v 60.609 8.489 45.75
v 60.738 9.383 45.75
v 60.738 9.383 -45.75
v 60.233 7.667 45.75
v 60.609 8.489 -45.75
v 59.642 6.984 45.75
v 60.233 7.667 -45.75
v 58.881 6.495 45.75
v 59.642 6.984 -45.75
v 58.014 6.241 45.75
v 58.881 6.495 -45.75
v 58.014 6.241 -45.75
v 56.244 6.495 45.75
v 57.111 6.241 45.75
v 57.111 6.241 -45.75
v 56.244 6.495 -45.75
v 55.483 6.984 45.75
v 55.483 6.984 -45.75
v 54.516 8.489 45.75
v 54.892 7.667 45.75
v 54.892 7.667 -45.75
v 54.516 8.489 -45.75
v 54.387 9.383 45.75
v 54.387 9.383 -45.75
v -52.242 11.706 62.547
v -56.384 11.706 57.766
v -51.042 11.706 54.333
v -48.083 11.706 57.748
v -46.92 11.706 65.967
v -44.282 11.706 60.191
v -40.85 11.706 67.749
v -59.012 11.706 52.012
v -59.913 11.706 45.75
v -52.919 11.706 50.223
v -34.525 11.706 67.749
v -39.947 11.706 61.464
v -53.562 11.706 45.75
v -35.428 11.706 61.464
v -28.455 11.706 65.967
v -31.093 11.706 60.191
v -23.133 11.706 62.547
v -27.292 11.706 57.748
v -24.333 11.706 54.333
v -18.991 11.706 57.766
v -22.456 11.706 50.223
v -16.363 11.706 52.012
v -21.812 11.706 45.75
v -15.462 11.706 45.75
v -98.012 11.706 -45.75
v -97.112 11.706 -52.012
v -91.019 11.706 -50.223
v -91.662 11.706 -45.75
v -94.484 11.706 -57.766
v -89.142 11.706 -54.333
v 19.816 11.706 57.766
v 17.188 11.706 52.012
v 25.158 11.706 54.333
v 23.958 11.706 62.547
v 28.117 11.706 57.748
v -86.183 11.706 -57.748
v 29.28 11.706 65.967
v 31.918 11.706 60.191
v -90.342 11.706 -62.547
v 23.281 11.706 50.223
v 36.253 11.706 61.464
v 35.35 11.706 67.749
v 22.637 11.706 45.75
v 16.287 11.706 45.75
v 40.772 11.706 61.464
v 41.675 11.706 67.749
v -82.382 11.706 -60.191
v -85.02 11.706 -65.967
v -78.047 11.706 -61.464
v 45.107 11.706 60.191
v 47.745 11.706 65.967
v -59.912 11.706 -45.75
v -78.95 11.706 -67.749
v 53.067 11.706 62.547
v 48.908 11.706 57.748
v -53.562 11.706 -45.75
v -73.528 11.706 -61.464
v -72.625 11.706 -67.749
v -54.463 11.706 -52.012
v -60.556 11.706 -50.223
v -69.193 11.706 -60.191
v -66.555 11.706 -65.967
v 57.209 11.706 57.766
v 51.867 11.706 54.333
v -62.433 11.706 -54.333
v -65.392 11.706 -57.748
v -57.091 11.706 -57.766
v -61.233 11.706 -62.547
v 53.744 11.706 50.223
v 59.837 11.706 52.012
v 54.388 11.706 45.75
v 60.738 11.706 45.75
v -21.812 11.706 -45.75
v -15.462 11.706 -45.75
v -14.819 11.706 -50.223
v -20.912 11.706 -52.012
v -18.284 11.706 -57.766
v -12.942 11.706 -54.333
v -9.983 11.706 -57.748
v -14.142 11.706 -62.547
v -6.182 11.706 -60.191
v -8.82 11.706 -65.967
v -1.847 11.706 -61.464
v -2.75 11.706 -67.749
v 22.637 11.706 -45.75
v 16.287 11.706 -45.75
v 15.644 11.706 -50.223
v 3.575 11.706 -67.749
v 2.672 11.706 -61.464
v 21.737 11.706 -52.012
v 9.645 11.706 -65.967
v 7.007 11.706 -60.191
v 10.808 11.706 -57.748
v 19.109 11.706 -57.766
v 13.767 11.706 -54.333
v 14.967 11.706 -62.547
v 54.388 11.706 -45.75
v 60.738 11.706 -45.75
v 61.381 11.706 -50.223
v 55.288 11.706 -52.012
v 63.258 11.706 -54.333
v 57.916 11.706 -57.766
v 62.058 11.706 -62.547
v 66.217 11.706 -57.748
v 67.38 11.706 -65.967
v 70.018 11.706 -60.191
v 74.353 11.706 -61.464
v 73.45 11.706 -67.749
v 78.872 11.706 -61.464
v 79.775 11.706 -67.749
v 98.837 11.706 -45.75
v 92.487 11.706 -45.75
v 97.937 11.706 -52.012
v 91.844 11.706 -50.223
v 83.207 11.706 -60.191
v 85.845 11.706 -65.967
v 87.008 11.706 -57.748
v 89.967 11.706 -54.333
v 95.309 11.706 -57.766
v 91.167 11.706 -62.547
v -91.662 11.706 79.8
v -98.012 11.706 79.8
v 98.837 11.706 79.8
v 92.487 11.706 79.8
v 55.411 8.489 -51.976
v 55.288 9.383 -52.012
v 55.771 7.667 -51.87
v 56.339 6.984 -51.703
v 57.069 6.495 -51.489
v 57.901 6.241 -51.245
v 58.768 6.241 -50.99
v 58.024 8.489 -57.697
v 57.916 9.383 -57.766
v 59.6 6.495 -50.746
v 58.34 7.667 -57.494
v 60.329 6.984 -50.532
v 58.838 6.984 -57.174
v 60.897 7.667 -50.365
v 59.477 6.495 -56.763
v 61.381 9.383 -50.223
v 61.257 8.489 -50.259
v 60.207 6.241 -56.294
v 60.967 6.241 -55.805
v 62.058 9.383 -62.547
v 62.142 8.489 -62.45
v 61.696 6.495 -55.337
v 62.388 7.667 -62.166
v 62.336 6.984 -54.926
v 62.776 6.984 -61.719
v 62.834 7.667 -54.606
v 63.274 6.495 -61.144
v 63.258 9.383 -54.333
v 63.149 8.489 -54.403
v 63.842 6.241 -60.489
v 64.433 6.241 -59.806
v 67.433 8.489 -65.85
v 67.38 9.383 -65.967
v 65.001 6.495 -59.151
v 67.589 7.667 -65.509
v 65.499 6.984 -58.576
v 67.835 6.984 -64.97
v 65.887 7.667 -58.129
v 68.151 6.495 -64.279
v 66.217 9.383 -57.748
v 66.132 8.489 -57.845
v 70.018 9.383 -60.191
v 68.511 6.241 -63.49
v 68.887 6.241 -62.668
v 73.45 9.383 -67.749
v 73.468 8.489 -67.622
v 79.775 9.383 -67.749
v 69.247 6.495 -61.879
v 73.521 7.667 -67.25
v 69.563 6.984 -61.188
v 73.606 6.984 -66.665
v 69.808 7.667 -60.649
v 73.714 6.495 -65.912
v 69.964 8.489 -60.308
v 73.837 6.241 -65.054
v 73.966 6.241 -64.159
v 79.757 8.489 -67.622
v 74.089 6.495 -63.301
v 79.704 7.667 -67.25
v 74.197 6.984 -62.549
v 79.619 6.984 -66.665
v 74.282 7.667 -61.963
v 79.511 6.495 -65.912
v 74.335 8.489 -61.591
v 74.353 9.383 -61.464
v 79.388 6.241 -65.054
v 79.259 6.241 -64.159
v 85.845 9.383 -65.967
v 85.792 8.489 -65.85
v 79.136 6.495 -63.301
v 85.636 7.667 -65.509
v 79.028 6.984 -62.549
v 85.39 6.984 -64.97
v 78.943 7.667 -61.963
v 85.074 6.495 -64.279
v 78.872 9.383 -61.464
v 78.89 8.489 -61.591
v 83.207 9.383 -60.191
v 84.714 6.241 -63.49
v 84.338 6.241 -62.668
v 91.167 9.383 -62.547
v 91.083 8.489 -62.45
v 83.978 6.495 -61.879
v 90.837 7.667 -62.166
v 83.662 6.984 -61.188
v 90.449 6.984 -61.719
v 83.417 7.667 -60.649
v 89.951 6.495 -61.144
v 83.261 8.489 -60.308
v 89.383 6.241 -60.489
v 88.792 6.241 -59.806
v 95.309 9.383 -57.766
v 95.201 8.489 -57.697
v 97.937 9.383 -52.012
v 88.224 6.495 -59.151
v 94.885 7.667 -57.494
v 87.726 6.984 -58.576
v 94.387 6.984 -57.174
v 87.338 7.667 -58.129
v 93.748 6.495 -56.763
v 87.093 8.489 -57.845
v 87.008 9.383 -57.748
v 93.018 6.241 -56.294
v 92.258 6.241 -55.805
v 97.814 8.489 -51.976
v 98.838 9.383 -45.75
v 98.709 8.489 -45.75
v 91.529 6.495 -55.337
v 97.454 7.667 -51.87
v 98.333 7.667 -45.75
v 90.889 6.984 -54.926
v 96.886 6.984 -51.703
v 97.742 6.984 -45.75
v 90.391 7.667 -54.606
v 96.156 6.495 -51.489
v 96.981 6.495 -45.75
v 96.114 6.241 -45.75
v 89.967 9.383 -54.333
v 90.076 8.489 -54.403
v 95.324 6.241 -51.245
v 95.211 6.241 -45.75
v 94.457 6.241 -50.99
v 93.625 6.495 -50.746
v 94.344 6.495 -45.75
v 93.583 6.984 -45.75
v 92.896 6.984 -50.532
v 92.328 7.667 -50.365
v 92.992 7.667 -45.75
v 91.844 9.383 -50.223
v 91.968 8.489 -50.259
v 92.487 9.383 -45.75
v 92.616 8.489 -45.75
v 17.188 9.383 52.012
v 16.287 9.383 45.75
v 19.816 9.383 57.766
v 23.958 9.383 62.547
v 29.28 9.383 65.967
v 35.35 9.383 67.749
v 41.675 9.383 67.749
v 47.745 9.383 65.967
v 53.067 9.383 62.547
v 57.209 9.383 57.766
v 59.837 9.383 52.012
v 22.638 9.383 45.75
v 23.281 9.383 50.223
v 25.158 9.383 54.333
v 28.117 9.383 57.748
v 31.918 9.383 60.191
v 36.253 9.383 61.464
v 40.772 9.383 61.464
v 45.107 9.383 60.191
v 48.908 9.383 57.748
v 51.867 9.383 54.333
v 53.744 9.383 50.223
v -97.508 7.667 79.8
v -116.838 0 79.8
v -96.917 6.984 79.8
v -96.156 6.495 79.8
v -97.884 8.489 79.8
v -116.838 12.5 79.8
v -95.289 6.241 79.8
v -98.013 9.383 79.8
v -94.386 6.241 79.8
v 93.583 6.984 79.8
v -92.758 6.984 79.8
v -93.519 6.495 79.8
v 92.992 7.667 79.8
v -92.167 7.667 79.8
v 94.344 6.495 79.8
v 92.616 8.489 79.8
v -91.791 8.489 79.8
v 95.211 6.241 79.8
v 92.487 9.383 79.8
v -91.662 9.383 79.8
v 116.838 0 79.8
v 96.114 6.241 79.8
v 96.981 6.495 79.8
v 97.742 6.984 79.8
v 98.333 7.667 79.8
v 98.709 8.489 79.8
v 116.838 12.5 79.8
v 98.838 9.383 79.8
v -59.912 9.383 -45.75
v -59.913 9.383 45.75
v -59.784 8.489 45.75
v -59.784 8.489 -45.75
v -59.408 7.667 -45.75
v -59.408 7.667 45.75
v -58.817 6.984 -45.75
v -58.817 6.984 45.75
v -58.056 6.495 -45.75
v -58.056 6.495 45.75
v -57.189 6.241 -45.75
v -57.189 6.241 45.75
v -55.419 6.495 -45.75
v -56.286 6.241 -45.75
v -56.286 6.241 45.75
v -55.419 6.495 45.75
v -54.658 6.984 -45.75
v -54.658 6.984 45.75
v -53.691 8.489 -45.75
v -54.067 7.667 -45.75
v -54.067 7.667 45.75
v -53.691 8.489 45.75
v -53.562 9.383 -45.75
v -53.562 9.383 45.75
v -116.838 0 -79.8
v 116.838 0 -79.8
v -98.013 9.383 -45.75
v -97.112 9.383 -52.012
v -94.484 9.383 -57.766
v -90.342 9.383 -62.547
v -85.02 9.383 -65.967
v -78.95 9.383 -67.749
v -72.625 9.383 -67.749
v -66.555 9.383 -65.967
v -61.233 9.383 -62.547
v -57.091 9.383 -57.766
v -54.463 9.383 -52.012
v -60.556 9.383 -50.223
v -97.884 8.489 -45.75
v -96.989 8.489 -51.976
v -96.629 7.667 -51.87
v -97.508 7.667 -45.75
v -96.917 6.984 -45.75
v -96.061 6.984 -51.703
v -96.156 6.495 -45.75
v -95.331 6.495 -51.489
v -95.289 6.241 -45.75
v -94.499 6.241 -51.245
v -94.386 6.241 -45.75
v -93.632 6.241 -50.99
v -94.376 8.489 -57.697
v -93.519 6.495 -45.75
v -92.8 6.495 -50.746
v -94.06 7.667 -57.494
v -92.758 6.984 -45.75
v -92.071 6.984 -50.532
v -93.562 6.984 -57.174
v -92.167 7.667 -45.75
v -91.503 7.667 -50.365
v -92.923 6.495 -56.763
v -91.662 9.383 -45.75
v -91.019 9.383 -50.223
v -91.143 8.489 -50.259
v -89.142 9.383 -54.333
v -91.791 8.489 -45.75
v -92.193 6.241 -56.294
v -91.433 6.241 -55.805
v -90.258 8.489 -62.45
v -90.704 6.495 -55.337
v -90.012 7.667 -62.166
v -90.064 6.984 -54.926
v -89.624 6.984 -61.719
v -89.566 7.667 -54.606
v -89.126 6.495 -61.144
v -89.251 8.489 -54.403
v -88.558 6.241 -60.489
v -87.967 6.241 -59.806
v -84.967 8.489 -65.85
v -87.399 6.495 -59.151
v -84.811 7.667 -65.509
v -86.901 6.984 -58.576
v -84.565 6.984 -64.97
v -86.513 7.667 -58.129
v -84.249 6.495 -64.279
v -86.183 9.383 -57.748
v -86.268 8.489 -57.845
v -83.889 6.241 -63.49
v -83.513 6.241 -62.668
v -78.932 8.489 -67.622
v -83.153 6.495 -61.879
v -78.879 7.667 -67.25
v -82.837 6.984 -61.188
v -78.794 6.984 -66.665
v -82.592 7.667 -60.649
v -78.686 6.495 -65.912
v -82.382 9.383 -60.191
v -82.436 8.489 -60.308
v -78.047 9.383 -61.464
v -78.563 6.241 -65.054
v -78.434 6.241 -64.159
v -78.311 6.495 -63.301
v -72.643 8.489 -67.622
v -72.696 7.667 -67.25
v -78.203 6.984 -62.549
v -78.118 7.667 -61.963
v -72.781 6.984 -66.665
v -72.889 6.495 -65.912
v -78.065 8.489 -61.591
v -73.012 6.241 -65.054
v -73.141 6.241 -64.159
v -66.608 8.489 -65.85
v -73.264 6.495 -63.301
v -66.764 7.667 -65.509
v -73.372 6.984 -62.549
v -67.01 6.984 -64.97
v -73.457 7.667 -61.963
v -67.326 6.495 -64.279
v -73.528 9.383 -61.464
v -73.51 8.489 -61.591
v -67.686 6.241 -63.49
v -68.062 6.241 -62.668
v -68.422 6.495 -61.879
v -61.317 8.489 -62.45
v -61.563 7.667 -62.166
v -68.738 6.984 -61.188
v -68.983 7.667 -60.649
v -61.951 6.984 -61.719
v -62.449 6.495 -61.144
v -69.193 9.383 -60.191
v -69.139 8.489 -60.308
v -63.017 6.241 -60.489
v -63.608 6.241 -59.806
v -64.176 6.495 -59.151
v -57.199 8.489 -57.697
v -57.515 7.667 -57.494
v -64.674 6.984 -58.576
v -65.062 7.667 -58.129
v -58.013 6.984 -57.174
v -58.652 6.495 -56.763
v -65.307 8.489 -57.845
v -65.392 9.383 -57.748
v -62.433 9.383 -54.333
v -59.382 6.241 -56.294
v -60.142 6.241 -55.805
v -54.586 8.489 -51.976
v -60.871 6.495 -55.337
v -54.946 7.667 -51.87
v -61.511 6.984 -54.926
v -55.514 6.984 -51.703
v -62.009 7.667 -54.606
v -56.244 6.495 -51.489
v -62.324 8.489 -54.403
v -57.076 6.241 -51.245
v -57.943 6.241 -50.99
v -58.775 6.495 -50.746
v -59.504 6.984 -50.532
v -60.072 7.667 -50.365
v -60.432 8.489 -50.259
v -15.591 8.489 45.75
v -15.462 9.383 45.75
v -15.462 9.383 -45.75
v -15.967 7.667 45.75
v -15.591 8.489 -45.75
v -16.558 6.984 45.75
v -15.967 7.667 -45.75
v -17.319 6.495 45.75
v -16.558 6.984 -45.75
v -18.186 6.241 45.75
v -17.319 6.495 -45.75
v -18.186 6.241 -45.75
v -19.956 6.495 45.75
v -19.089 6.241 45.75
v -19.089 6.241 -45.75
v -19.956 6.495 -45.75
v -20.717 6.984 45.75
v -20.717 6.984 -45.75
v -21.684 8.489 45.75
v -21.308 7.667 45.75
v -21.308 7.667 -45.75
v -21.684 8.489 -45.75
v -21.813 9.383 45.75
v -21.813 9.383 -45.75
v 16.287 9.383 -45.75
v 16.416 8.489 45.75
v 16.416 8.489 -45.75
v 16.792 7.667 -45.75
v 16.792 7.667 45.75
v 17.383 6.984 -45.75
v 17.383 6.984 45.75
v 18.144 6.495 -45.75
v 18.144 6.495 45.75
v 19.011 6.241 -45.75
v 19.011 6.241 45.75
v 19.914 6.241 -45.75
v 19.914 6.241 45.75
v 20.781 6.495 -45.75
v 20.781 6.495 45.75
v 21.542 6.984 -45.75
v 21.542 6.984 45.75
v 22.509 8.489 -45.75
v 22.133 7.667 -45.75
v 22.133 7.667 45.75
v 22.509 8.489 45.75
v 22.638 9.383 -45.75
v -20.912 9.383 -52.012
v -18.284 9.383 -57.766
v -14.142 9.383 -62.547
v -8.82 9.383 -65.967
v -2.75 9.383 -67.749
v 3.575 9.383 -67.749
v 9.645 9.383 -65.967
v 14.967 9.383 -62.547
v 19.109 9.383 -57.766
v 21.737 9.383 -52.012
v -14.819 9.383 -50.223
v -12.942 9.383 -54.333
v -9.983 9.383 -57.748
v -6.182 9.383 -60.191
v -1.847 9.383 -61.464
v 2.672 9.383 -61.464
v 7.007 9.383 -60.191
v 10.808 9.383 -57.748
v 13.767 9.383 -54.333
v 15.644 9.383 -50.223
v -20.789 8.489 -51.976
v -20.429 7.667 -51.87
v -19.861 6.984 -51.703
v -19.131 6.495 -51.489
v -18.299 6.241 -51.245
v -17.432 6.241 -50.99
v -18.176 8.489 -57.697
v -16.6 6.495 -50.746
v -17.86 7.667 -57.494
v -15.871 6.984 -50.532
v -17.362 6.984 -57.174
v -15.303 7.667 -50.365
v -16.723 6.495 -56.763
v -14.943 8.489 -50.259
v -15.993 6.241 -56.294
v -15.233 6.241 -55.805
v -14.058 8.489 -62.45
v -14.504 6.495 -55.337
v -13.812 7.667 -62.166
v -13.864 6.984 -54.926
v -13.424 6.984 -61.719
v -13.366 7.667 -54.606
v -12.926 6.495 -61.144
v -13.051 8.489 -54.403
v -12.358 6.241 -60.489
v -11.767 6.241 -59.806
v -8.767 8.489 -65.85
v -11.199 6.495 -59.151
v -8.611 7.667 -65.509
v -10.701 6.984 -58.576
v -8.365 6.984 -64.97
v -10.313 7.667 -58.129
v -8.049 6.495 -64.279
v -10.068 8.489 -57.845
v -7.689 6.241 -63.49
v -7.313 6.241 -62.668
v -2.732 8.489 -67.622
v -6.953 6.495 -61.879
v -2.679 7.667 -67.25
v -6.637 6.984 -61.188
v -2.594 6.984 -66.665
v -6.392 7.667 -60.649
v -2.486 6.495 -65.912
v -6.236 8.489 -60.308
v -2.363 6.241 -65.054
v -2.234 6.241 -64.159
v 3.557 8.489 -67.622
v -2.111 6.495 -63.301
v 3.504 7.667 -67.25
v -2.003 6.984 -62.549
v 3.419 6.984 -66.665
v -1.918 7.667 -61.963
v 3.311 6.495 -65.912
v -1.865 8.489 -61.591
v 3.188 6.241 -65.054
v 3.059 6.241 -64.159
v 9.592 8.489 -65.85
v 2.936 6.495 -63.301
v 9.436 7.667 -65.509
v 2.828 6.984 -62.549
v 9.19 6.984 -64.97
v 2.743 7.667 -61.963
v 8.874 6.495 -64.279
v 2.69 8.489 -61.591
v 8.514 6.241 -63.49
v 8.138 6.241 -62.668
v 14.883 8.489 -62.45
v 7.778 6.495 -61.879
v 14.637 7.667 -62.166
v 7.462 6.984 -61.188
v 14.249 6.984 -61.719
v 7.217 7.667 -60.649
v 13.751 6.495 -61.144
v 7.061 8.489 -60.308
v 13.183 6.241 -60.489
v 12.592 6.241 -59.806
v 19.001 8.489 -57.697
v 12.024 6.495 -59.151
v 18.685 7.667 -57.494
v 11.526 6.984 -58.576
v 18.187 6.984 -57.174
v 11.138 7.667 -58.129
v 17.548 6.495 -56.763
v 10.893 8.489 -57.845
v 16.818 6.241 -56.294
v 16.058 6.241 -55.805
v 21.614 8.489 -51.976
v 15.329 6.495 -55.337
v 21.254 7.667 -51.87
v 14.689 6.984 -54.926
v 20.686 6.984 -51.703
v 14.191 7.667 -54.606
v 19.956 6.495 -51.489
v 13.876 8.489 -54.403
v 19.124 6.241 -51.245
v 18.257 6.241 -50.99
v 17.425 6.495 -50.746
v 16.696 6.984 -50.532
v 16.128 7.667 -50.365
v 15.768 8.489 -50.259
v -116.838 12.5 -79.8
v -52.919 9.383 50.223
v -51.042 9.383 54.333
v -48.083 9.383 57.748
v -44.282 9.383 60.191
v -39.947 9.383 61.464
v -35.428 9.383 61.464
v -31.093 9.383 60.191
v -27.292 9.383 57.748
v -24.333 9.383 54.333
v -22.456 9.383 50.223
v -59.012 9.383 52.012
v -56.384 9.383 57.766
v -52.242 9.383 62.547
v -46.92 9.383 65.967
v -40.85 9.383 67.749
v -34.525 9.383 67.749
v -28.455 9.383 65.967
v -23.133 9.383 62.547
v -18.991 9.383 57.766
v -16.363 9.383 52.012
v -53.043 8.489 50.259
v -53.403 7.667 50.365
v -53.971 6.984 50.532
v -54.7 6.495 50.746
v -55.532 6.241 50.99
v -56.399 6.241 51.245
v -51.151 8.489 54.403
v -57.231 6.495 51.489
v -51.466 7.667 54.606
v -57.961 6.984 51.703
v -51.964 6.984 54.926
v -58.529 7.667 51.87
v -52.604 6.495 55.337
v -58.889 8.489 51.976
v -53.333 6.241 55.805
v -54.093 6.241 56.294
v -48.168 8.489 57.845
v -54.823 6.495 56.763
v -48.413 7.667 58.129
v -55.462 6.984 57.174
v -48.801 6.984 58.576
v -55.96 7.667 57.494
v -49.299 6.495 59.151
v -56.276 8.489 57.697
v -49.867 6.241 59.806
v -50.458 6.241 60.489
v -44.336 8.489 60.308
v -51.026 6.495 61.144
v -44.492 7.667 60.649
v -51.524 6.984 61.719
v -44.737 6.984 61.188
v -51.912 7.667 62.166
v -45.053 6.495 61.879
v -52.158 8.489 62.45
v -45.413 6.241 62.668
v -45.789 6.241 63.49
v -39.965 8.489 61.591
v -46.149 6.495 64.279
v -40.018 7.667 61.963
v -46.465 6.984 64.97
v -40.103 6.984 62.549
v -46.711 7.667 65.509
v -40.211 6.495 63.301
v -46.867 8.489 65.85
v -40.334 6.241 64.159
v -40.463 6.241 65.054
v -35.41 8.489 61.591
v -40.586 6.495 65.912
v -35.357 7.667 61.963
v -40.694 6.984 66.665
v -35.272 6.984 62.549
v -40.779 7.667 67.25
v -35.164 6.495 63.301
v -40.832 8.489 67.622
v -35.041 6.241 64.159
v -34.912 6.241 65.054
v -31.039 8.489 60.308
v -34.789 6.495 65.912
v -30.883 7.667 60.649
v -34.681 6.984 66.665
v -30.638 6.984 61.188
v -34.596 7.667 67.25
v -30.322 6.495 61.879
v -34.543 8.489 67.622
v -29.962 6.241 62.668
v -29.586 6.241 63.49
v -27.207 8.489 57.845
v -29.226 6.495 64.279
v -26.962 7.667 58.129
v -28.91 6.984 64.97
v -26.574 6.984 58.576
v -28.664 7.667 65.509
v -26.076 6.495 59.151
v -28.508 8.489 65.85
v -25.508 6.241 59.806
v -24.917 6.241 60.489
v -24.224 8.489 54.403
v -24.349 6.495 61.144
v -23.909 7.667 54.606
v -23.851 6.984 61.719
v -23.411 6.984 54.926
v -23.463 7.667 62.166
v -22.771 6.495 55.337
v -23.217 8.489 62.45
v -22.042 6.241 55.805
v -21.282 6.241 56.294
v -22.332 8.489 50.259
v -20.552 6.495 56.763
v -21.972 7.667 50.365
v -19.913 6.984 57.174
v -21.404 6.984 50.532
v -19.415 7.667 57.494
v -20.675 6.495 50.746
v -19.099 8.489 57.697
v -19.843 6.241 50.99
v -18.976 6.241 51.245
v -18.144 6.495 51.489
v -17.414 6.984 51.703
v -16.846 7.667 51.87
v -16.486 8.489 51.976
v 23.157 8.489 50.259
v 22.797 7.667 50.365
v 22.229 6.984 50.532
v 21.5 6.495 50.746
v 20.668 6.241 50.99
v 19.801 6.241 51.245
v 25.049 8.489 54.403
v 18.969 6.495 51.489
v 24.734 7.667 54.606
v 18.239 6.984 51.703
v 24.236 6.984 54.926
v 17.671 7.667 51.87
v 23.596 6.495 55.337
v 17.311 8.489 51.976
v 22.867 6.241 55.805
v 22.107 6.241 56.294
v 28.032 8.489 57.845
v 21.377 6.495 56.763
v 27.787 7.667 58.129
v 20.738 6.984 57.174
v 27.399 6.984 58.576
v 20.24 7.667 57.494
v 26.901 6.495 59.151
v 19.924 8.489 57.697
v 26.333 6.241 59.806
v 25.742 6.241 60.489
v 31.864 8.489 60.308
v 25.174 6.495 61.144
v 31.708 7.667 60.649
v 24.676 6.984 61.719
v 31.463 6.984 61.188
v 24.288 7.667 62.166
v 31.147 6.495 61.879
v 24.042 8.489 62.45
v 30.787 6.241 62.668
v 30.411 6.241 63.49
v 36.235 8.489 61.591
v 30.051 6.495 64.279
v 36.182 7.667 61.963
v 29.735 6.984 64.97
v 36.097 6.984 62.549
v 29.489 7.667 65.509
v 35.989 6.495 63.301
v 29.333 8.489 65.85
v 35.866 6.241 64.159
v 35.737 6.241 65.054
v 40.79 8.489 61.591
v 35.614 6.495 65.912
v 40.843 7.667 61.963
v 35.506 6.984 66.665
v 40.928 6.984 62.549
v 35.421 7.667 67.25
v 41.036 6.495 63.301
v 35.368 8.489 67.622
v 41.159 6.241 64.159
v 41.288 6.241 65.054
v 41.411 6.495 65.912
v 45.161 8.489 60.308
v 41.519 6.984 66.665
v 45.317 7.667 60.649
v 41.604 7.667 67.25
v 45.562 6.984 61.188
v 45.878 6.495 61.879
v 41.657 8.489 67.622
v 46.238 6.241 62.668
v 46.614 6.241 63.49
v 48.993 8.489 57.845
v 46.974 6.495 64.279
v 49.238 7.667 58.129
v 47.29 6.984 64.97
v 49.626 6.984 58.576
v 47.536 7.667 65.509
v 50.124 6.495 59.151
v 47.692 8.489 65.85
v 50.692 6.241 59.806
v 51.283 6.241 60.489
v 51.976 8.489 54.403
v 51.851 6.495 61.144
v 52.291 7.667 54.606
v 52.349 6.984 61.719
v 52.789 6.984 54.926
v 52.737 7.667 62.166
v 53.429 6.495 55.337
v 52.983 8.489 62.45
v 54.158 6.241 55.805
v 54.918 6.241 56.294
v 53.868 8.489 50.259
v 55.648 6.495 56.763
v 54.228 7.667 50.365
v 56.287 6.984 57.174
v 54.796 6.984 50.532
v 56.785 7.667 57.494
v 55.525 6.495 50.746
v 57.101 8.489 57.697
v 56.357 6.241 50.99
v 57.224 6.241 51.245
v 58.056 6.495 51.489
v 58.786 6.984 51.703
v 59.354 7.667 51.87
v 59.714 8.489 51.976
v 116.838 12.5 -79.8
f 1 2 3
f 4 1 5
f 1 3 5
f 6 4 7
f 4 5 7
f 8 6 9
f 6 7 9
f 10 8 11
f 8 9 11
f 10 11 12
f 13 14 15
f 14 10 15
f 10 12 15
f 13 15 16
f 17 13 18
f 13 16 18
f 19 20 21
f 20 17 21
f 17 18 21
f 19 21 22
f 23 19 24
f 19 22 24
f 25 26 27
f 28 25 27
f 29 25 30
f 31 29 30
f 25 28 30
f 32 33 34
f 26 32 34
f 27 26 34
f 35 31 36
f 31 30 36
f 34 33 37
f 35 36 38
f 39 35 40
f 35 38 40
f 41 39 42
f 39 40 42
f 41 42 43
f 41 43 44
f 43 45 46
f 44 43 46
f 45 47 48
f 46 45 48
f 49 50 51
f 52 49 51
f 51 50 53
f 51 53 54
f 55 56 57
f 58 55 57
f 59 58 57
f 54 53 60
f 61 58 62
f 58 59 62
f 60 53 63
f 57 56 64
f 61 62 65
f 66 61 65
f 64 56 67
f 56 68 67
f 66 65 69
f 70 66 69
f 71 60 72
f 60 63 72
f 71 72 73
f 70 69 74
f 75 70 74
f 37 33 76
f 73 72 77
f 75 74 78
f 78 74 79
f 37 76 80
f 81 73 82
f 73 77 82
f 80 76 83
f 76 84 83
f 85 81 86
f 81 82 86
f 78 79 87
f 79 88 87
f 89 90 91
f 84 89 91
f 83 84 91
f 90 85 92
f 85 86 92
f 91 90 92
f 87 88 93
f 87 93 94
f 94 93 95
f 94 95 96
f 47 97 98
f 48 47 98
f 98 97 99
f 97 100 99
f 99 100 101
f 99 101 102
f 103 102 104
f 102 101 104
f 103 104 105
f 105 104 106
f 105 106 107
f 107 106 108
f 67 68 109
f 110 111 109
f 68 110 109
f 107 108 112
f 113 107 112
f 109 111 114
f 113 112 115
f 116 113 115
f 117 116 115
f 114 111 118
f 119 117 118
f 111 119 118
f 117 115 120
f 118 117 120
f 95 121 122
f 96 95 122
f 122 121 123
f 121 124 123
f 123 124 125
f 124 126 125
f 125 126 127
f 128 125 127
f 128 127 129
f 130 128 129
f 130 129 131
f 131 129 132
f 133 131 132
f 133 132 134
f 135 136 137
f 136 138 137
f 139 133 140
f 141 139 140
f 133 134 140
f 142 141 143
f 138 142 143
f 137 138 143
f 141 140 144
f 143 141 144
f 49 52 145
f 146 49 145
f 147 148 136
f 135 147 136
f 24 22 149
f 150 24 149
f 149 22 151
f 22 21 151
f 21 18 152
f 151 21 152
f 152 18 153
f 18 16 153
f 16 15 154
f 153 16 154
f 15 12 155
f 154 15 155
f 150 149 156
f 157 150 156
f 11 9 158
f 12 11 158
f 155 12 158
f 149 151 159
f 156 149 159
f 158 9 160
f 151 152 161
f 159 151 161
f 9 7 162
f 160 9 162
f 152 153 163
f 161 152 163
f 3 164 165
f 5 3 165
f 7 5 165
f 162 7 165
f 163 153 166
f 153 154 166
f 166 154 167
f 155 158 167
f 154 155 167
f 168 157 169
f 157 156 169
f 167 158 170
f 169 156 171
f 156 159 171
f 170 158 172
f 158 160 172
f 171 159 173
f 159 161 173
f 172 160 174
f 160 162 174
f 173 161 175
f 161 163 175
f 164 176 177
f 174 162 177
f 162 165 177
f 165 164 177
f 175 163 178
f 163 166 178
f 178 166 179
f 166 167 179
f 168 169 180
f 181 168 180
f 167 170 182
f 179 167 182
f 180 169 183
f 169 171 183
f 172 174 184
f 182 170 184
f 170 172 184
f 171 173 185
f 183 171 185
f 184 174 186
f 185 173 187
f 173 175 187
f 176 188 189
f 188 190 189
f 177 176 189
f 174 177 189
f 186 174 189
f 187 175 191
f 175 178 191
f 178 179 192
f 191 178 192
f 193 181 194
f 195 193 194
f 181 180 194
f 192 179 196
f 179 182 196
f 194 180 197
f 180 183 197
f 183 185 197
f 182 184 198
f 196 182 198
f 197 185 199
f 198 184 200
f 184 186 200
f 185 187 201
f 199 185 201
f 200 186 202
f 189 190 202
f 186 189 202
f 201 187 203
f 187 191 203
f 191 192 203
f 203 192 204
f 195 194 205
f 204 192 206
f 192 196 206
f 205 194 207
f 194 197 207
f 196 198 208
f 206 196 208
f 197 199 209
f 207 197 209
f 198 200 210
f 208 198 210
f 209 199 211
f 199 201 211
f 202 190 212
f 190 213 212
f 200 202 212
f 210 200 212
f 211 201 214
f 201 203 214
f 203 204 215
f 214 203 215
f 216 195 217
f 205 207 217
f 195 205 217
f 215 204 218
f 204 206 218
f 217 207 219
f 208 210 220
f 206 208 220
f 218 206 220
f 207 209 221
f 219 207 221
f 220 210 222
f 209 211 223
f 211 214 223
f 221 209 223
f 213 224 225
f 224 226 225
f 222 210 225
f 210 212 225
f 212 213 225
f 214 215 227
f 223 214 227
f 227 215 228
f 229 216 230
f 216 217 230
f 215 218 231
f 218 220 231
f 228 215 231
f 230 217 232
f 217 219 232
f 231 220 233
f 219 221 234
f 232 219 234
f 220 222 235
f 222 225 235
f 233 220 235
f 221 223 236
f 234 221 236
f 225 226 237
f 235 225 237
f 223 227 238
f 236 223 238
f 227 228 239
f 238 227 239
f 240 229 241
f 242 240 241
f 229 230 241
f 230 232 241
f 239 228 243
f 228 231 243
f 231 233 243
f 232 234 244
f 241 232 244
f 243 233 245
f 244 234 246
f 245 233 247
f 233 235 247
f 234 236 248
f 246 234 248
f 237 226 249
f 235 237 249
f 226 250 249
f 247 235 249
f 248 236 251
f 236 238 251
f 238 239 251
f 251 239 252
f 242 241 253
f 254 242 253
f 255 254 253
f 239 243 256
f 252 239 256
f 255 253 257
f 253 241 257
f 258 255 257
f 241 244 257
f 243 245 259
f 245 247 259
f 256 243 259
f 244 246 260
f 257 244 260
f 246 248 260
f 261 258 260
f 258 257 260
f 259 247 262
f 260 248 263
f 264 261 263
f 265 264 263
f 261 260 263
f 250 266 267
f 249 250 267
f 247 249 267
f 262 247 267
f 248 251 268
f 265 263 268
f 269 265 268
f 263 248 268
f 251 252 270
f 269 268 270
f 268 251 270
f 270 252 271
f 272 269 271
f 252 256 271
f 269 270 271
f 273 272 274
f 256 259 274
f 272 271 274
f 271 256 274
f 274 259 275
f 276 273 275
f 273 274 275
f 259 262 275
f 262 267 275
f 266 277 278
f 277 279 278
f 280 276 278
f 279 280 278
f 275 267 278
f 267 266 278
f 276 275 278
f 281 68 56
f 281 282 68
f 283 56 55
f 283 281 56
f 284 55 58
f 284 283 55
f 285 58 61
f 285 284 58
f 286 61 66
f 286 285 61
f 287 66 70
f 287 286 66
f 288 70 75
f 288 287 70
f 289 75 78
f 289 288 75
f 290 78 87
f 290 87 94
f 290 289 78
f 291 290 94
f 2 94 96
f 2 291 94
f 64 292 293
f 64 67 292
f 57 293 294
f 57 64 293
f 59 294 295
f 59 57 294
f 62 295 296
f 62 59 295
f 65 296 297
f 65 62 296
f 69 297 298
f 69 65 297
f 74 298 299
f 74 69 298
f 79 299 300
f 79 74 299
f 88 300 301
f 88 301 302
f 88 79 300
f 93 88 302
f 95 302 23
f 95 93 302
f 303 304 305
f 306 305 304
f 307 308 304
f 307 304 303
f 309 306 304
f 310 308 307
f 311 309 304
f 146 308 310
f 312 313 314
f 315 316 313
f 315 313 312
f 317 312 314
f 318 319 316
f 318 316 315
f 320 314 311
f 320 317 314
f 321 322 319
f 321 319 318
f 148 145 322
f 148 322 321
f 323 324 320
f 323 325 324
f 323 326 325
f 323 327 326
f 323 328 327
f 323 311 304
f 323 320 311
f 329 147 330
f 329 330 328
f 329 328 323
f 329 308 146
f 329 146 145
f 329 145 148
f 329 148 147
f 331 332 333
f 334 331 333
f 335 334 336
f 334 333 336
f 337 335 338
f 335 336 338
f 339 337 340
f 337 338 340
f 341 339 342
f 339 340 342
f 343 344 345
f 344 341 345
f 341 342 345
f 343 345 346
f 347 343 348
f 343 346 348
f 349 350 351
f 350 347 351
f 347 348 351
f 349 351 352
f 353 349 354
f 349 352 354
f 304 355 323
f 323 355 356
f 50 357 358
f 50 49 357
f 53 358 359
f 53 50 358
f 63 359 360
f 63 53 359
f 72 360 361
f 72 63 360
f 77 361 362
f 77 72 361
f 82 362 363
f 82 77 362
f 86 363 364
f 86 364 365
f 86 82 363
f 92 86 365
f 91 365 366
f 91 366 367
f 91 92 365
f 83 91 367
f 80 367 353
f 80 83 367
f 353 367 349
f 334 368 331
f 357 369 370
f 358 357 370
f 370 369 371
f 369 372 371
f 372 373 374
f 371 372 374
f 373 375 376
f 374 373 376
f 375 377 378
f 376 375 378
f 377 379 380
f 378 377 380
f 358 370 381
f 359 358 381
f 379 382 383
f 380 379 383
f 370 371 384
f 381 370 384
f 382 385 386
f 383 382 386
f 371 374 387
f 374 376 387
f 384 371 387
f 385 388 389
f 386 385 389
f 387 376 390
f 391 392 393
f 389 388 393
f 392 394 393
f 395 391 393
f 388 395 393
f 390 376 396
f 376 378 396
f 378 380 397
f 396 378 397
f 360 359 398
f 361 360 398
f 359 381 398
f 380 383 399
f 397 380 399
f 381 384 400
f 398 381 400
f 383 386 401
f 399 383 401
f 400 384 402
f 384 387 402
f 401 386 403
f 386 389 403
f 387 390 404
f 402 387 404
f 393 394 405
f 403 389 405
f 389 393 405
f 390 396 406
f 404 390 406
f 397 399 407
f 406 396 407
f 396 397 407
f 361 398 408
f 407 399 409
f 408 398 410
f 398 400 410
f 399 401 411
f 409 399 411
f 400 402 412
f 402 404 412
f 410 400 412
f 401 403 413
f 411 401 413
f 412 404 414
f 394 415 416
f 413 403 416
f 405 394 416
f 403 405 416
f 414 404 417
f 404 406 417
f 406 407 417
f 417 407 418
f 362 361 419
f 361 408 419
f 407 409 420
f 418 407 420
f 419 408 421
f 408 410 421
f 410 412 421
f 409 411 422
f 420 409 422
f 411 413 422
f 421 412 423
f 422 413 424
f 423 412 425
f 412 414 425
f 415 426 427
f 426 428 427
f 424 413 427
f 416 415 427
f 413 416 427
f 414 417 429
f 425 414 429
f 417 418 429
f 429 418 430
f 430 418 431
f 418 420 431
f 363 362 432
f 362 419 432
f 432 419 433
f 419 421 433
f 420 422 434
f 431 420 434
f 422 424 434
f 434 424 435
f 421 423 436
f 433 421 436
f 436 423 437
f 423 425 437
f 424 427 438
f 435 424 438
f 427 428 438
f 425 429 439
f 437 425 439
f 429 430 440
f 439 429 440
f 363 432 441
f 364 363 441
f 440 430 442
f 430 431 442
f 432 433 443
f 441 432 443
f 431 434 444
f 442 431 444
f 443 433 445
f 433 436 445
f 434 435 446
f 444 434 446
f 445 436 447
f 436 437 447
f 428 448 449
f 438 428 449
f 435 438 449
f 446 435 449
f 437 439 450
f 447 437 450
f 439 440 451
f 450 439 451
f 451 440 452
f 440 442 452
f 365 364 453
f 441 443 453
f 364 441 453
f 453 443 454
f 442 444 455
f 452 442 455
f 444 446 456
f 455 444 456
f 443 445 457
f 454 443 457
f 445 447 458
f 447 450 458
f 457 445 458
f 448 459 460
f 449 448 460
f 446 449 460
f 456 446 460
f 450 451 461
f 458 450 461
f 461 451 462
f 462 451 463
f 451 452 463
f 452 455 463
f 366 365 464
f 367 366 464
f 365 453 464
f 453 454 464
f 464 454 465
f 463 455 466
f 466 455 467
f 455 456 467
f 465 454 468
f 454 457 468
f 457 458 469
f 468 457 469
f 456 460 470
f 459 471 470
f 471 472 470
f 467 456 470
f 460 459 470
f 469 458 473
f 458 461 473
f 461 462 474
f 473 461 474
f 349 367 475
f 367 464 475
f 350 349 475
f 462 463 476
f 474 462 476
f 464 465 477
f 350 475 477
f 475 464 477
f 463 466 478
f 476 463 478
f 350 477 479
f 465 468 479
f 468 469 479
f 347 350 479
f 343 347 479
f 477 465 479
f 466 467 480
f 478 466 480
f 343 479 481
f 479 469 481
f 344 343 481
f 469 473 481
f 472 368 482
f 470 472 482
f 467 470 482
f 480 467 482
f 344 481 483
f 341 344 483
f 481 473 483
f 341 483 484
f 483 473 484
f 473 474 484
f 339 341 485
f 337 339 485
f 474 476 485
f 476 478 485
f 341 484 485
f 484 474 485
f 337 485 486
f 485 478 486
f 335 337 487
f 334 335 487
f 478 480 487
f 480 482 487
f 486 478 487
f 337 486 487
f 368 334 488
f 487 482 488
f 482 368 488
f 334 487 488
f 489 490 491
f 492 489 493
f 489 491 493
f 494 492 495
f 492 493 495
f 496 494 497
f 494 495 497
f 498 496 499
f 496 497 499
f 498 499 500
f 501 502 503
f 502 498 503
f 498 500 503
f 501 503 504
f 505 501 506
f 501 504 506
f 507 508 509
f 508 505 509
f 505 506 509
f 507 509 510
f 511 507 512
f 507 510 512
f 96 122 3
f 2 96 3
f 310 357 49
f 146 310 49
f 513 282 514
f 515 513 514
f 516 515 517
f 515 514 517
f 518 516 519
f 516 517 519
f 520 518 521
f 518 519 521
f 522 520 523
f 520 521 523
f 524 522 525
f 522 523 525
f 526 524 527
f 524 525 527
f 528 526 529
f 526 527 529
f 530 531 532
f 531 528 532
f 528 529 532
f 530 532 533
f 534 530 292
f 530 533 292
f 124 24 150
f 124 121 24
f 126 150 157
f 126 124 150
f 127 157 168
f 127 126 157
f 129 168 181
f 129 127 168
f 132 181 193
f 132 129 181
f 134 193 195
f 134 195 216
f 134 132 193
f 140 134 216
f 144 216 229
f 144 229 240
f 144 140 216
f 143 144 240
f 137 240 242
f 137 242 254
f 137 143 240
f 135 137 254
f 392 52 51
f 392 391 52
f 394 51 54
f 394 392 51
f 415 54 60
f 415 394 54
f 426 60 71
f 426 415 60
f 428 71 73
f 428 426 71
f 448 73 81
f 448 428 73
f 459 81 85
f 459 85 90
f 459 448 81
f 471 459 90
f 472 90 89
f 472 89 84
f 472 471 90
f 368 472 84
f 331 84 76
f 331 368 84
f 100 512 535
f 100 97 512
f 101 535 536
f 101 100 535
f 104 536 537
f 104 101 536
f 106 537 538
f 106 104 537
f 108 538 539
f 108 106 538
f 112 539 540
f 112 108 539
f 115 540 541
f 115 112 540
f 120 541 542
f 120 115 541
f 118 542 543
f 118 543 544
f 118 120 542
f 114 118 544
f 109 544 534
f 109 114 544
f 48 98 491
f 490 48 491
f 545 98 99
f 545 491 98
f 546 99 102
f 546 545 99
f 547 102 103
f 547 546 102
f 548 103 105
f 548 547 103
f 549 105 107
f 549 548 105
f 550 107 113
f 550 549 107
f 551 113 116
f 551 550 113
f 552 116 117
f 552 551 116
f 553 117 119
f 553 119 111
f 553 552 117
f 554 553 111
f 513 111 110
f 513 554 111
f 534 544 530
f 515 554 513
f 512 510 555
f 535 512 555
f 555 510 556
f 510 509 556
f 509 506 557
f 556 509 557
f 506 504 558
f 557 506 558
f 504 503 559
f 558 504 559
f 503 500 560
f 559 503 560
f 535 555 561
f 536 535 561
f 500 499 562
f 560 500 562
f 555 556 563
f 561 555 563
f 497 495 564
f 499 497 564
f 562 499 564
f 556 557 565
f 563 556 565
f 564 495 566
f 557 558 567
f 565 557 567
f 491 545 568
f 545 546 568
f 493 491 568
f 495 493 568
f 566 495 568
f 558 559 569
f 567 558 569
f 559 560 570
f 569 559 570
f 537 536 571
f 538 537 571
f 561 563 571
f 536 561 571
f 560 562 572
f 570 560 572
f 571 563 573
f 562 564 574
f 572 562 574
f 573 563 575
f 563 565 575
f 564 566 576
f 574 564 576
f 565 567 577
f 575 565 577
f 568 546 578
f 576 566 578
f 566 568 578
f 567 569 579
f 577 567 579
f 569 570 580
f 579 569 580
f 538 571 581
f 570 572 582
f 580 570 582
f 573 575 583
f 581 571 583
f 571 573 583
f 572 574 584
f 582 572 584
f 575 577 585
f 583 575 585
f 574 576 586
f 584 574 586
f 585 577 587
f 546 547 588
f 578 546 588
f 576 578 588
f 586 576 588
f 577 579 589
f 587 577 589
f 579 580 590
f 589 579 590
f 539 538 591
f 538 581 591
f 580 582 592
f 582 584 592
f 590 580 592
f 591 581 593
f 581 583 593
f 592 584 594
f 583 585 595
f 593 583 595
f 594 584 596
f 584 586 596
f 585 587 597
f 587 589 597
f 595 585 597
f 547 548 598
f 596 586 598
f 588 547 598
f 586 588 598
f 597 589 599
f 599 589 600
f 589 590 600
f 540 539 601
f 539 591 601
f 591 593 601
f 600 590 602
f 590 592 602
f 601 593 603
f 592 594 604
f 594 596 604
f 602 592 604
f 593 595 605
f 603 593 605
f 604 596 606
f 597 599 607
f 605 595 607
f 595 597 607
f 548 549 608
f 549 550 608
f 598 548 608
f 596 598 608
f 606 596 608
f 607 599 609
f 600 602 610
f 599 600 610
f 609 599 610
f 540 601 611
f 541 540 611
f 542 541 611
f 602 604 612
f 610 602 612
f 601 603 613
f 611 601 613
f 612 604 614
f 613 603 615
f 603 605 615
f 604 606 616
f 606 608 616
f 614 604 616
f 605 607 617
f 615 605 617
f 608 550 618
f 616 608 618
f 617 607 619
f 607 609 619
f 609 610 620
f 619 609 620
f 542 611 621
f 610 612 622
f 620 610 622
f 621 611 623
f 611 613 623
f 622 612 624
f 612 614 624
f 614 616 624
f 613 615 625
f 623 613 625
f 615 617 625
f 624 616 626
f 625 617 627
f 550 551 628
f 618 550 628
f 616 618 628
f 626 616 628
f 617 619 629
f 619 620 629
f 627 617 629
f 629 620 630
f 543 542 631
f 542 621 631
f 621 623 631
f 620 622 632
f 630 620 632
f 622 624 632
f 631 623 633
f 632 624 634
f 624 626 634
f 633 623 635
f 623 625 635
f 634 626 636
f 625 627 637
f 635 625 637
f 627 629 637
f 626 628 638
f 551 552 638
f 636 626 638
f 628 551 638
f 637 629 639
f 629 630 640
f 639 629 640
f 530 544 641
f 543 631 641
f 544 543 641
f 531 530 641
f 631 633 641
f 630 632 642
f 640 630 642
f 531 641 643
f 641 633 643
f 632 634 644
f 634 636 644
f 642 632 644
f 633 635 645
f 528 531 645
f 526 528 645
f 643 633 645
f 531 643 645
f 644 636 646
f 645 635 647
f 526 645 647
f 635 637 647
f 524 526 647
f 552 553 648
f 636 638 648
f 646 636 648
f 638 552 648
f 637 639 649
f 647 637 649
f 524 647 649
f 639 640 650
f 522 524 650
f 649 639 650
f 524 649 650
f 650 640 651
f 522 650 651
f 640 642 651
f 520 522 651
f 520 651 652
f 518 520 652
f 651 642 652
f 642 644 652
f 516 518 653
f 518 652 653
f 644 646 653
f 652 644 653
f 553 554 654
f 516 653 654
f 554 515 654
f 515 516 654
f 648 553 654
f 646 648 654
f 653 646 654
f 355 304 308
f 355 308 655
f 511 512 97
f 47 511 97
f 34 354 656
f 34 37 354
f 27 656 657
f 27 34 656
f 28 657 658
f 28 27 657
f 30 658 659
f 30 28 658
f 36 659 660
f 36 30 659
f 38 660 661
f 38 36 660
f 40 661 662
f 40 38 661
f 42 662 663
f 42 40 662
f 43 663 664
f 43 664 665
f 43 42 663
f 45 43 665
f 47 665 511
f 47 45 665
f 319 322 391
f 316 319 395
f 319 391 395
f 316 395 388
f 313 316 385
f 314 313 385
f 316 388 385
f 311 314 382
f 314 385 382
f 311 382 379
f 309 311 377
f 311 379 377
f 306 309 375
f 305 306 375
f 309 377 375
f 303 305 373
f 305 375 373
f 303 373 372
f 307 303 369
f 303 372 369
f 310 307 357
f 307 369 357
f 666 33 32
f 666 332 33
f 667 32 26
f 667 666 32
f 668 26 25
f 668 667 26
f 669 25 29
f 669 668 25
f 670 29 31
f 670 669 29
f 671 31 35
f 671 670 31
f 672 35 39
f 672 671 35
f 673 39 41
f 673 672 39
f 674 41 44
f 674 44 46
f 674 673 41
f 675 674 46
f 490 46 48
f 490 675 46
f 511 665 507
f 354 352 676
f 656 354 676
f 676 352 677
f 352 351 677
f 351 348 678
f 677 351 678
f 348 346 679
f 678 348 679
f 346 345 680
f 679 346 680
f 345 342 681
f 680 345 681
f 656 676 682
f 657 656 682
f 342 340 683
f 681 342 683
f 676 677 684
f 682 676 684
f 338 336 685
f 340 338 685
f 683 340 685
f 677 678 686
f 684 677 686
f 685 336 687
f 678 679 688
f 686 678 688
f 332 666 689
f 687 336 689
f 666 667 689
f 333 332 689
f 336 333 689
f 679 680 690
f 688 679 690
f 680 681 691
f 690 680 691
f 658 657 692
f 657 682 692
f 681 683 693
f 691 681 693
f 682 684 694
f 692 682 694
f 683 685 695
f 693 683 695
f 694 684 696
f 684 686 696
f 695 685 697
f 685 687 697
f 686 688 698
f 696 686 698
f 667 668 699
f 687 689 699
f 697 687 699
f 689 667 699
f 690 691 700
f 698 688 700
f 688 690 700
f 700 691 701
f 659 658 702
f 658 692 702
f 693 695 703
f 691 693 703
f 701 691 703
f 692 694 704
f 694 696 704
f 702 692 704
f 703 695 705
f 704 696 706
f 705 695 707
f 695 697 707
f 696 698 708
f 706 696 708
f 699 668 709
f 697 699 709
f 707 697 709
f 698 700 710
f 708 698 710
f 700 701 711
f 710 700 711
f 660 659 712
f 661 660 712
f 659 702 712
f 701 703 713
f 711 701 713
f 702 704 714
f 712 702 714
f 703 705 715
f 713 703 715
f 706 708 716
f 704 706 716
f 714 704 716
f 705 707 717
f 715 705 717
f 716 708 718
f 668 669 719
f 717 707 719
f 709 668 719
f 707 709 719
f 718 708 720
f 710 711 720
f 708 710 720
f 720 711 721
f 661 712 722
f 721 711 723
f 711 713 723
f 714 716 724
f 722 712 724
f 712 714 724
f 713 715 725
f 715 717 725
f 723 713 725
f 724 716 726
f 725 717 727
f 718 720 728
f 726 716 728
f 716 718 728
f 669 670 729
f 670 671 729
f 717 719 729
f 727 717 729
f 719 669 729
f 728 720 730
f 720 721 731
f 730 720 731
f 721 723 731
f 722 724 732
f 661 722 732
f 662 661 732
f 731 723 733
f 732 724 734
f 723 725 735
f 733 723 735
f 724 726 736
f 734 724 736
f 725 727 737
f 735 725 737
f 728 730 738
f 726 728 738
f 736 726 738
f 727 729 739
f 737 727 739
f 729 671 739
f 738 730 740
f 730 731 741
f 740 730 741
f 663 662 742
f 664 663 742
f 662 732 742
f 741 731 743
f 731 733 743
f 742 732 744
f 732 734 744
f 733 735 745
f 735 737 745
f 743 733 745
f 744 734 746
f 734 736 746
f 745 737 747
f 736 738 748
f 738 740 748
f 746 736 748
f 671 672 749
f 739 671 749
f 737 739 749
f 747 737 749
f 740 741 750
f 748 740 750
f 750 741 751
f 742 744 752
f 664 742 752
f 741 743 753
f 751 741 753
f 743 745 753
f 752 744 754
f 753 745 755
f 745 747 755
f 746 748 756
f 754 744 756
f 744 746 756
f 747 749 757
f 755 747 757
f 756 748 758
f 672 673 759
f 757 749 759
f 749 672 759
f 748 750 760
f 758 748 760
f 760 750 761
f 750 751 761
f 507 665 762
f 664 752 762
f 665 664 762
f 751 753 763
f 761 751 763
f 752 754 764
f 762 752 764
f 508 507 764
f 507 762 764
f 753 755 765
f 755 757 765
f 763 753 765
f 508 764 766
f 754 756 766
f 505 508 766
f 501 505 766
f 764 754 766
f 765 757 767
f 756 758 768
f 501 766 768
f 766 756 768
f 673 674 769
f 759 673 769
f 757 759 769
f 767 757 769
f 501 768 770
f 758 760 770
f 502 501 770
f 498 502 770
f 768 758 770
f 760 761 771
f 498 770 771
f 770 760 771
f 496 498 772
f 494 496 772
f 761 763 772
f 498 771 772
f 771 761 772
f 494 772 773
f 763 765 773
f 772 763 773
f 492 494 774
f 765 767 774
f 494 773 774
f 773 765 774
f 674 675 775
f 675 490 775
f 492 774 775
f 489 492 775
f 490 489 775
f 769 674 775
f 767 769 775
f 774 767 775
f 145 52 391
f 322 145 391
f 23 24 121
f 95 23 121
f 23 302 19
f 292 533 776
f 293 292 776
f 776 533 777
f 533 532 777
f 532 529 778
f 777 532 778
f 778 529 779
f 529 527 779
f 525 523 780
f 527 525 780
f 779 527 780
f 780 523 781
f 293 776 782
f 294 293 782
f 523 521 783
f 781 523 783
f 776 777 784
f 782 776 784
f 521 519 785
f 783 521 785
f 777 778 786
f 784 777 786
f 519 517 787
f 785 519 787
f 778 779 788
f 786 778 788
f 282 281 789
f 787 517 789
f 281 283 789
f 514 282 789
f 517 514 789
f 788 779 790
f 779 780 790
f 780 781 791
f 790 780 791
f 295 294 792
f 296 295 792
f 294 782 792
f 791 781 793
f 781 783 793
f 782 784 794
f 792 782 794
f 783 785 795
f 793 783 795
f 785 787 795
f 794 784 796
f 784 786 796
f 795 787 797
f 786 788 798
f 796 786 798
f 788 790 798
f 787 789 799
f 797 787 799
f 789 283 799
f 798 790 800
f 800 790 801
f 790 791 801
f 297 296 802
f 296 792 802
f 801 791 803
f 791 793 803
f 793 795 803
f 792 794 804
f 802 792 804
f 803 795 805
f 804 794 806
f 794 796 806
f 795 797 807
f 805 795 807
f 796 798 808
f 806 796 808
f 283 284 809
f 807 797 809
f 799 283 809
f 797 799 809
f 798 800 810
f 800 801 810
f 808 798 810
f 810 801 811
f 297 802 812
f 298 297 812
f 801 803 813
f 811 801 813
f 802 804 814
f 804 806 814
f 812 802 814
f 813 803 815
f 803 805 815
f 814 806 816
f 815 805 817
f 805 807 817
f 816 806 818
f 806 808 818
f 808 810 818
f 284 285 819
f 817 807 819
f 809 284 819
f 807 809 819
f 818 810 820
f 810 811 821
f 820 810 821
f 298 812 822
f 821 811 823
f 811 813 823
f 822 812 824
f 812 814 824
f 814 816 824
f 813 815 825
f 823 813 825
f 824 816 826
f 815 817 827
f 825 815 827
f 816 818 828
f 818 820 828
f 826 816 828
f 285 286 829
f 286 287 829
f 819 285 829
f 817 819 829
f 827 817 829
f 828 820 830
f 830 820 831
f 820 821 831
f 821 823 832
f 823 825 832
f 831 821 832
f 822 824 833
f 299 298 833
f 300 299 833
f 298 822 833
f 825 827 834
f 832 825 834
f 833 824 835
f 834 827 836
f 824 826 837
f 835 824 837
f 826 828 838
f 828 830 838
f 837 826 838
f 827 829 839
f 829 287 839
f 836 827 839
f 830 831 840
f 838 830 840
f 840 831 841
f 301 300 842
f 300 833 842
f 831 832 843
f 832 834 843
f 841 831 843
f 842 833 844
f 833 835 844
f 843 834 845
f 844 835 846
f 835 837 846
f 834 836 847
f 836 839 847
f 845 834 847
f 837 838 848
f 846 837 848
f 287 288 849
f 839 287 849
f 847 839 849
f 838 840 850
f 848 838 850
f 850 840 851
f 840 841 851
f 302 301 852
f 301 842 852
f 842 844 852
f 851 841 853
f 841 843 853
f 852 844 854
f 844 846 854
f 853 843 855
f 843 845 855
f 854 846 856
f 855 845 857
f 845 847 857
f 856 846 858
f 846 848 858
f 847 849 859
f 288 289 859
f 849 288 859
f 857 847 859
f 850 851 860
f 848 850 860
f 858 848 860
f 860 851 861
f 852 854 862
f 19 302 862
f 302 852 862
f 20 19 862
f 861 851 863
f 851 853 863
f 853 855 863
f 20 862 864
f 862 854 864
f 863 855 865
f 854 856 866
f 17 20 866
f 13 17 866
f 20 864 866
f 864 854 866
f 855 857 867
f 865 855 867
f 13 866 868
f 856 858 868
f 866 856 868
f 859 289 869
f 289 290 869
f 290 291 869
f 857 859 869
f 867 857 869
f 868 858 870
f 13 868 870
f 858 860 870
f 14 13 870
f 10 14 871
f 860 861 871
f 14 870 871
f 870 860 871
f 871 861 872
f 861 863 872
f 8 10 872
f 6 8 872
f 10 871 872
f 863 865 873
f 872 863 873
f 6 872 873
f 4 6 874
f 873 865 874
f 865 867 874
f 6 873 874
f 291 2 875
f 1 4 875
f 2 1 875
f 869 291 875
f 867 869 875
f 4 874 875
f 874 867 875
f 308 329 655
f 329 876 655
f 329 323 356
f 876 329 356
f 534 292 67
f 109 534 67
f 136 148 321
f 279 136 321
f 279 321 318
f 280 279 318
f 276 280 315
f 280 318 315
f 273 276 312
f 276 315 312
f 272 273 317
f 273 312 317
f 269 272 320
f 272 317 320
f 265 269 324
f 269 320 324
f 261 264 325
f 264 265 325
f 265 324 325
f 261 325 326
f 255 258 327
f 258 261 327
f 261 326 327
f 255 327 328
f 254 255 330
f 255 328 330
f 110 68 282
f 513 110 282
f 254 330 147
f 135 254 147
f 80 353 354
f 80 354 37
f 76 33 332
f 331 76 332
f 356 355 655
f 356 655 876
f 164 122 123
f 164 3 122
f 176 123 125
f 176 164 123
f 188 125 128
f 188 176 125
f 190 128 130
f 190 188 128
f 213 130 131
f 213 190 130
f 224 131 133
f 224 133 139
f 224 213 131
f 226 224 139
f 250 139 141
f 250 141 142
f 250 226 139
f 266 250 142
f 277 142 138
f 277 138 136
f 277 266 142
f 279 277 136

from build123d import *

# Parameters (mm, degrees)
SKETCH1_W           = 233.675
SKETCH1_H           = 159.601
BOSS_EXTRUDE1_DEPTH = 12.5


with BuildPart() as part:
    # Sketch1 → Boss-Extrude1 (new body)
    with BuildSketch(Plane(origin=(0, 0, 0), x_dir=(1, 0, 0), z_dir=(0, 1, 0))):
        Rectangle(SKETCH1_W, SKETCH1_H)
    extrude(amount=BOSS_EXTRUDE1_DEPTH)

    # Cut-Sweep1: sweep along a path in Sketch2
    with BuildLine(Plane(origin=(0, 12.5, 0), x_dir=(1, 0, 0), z_dir=(0, 1, 0))) as cut_sweep1_path:
        Line((-94.8375, -79.8005), (-94.8375, 45.7505))
        ThreePointArc((-94.8375, 45.7505), (-75.7875, 64.8005), (-56.7375, 45.7505))
        Line((-56.7375, 45.7505), (-56.7375, -45.7505))
        ThreePointArc((-56.7375, -45.7505), (-37.6875, -64.8005), (-18.6375, -45.7505))
        Line((-18.6375, -45.7505), (-18.6375, 45.7505))
        ThreePointArc((-18.6375, 45.7505), (0.4125, 64.8005), (19.4625, 45.7505))
        Line((19.4625, 45.7505), (19.4625, -45.7505))
        ThreePointArc((19.4625, -45.7505), (38.5125, -64.8005), (57.5625, -45.7505))
        Line((57.5625, -45.7505), (57.5625, 45.7505))
        ThreePointArc((57.5625, 45.7505), (76.6125, 64.8005), (95.6625, 45.7505))
        Line((95.6625, 45.7505), (95.6625, -79.8005))
    # Sketch3 → Cut-Sweep1 (sweep, cut)
    with BuildSketch(Plane.XY.offset(79.8005)):
        with BuildLine():
            Line((-98.80625, 9.38342), (-98.80625, 12.5))
            Line((-98.80625, 12.5), (-90.86875, 12.5))
            Line((-90.86875, 12.5), (-90.86875, 9.38342))
            ThreePointArc((-90.86875, 9.38342), (-94.8375, 5.41467), (-98.80625, 9.38342))
        make_face()
    sweep(path=cut_sweep1_path.line, mode=Mode.SUBTRACT)

    # Sweep1: sweep along a path in Sketch2<3>
    with BuildLine(Plane(origin=(0, 12.5, 0), x_dir=(1, 0, 0), z_dir=(0, 1, 0))) as sweep1_path:
        Line((-94.8375, -79.8005), (-94.8375, 45.7505))
        ThreePointArc((-94.8375, 45.7505), (-75.7875, 64.8005), (-56.7375, 45.7505))
        Line((-56.7375, 45.7505), (-56.7375, -45.7505))
        ThreePointArc((-56.7375, -45.7505), (-37.6875, -64.8005), (-18.6375, -45.7505))
        Line((-18.6375, -45.7505), (-18.6375, 45.7505))
        ThreePointArc((-18.6375, 45.7505), (0.4125, 64.8005), (19.4625, 45.7505))
        Line((19.4625, 45.7505), (19.4625, -45.7505))
        ThreePointArc((19.4625, -45.7505), (38.5125, -64.8005), (57.5625, -45.7505))
        Line((57.5625, -45.7505), (57.5625, 45.7505))
        ThreePointArc((57.5625, 45.7505), (76.6125, 64.8005), (95.6625, 45.7505))
        Line((95.6625, 45.7505), (95.6625, -79.8005))
    # Sketch4 → Sweep1 (sweep)
    with BuildSketch(Plane.XY.offset(79.8005)):
        with BuildLine():
            Line((-98.80625, 9.38342), (-98.80625, 12.5))
            Line((-98.80625, 12.5), (-90.86875, 12.5))
            Line((-90.86875, 12.5), (-90.86875, 9.38342))
            ThreePointArc((-90.86875, 9.38342), (-94.8375, 5.41467), (-98.80625, 9.38342))
        make_face()
        with BuildLine():
            Line((-98.0125, 9.38342), (-98.0125, 11.70625))
            Line((-98.0125, 11.70625), (-91.6625, 11.70625))
            Line((-91.6625, 11.70625), (-91.6625, 9.38342))
            ThreePointArc((-91.6625, 9.38342), (-94.8375, 6.20842), (-98.0125, 9.38342))
        make_face(mode=Mode.SUBTRACT)
    sweep(path=sweep1_path.line)


solid = part.part
